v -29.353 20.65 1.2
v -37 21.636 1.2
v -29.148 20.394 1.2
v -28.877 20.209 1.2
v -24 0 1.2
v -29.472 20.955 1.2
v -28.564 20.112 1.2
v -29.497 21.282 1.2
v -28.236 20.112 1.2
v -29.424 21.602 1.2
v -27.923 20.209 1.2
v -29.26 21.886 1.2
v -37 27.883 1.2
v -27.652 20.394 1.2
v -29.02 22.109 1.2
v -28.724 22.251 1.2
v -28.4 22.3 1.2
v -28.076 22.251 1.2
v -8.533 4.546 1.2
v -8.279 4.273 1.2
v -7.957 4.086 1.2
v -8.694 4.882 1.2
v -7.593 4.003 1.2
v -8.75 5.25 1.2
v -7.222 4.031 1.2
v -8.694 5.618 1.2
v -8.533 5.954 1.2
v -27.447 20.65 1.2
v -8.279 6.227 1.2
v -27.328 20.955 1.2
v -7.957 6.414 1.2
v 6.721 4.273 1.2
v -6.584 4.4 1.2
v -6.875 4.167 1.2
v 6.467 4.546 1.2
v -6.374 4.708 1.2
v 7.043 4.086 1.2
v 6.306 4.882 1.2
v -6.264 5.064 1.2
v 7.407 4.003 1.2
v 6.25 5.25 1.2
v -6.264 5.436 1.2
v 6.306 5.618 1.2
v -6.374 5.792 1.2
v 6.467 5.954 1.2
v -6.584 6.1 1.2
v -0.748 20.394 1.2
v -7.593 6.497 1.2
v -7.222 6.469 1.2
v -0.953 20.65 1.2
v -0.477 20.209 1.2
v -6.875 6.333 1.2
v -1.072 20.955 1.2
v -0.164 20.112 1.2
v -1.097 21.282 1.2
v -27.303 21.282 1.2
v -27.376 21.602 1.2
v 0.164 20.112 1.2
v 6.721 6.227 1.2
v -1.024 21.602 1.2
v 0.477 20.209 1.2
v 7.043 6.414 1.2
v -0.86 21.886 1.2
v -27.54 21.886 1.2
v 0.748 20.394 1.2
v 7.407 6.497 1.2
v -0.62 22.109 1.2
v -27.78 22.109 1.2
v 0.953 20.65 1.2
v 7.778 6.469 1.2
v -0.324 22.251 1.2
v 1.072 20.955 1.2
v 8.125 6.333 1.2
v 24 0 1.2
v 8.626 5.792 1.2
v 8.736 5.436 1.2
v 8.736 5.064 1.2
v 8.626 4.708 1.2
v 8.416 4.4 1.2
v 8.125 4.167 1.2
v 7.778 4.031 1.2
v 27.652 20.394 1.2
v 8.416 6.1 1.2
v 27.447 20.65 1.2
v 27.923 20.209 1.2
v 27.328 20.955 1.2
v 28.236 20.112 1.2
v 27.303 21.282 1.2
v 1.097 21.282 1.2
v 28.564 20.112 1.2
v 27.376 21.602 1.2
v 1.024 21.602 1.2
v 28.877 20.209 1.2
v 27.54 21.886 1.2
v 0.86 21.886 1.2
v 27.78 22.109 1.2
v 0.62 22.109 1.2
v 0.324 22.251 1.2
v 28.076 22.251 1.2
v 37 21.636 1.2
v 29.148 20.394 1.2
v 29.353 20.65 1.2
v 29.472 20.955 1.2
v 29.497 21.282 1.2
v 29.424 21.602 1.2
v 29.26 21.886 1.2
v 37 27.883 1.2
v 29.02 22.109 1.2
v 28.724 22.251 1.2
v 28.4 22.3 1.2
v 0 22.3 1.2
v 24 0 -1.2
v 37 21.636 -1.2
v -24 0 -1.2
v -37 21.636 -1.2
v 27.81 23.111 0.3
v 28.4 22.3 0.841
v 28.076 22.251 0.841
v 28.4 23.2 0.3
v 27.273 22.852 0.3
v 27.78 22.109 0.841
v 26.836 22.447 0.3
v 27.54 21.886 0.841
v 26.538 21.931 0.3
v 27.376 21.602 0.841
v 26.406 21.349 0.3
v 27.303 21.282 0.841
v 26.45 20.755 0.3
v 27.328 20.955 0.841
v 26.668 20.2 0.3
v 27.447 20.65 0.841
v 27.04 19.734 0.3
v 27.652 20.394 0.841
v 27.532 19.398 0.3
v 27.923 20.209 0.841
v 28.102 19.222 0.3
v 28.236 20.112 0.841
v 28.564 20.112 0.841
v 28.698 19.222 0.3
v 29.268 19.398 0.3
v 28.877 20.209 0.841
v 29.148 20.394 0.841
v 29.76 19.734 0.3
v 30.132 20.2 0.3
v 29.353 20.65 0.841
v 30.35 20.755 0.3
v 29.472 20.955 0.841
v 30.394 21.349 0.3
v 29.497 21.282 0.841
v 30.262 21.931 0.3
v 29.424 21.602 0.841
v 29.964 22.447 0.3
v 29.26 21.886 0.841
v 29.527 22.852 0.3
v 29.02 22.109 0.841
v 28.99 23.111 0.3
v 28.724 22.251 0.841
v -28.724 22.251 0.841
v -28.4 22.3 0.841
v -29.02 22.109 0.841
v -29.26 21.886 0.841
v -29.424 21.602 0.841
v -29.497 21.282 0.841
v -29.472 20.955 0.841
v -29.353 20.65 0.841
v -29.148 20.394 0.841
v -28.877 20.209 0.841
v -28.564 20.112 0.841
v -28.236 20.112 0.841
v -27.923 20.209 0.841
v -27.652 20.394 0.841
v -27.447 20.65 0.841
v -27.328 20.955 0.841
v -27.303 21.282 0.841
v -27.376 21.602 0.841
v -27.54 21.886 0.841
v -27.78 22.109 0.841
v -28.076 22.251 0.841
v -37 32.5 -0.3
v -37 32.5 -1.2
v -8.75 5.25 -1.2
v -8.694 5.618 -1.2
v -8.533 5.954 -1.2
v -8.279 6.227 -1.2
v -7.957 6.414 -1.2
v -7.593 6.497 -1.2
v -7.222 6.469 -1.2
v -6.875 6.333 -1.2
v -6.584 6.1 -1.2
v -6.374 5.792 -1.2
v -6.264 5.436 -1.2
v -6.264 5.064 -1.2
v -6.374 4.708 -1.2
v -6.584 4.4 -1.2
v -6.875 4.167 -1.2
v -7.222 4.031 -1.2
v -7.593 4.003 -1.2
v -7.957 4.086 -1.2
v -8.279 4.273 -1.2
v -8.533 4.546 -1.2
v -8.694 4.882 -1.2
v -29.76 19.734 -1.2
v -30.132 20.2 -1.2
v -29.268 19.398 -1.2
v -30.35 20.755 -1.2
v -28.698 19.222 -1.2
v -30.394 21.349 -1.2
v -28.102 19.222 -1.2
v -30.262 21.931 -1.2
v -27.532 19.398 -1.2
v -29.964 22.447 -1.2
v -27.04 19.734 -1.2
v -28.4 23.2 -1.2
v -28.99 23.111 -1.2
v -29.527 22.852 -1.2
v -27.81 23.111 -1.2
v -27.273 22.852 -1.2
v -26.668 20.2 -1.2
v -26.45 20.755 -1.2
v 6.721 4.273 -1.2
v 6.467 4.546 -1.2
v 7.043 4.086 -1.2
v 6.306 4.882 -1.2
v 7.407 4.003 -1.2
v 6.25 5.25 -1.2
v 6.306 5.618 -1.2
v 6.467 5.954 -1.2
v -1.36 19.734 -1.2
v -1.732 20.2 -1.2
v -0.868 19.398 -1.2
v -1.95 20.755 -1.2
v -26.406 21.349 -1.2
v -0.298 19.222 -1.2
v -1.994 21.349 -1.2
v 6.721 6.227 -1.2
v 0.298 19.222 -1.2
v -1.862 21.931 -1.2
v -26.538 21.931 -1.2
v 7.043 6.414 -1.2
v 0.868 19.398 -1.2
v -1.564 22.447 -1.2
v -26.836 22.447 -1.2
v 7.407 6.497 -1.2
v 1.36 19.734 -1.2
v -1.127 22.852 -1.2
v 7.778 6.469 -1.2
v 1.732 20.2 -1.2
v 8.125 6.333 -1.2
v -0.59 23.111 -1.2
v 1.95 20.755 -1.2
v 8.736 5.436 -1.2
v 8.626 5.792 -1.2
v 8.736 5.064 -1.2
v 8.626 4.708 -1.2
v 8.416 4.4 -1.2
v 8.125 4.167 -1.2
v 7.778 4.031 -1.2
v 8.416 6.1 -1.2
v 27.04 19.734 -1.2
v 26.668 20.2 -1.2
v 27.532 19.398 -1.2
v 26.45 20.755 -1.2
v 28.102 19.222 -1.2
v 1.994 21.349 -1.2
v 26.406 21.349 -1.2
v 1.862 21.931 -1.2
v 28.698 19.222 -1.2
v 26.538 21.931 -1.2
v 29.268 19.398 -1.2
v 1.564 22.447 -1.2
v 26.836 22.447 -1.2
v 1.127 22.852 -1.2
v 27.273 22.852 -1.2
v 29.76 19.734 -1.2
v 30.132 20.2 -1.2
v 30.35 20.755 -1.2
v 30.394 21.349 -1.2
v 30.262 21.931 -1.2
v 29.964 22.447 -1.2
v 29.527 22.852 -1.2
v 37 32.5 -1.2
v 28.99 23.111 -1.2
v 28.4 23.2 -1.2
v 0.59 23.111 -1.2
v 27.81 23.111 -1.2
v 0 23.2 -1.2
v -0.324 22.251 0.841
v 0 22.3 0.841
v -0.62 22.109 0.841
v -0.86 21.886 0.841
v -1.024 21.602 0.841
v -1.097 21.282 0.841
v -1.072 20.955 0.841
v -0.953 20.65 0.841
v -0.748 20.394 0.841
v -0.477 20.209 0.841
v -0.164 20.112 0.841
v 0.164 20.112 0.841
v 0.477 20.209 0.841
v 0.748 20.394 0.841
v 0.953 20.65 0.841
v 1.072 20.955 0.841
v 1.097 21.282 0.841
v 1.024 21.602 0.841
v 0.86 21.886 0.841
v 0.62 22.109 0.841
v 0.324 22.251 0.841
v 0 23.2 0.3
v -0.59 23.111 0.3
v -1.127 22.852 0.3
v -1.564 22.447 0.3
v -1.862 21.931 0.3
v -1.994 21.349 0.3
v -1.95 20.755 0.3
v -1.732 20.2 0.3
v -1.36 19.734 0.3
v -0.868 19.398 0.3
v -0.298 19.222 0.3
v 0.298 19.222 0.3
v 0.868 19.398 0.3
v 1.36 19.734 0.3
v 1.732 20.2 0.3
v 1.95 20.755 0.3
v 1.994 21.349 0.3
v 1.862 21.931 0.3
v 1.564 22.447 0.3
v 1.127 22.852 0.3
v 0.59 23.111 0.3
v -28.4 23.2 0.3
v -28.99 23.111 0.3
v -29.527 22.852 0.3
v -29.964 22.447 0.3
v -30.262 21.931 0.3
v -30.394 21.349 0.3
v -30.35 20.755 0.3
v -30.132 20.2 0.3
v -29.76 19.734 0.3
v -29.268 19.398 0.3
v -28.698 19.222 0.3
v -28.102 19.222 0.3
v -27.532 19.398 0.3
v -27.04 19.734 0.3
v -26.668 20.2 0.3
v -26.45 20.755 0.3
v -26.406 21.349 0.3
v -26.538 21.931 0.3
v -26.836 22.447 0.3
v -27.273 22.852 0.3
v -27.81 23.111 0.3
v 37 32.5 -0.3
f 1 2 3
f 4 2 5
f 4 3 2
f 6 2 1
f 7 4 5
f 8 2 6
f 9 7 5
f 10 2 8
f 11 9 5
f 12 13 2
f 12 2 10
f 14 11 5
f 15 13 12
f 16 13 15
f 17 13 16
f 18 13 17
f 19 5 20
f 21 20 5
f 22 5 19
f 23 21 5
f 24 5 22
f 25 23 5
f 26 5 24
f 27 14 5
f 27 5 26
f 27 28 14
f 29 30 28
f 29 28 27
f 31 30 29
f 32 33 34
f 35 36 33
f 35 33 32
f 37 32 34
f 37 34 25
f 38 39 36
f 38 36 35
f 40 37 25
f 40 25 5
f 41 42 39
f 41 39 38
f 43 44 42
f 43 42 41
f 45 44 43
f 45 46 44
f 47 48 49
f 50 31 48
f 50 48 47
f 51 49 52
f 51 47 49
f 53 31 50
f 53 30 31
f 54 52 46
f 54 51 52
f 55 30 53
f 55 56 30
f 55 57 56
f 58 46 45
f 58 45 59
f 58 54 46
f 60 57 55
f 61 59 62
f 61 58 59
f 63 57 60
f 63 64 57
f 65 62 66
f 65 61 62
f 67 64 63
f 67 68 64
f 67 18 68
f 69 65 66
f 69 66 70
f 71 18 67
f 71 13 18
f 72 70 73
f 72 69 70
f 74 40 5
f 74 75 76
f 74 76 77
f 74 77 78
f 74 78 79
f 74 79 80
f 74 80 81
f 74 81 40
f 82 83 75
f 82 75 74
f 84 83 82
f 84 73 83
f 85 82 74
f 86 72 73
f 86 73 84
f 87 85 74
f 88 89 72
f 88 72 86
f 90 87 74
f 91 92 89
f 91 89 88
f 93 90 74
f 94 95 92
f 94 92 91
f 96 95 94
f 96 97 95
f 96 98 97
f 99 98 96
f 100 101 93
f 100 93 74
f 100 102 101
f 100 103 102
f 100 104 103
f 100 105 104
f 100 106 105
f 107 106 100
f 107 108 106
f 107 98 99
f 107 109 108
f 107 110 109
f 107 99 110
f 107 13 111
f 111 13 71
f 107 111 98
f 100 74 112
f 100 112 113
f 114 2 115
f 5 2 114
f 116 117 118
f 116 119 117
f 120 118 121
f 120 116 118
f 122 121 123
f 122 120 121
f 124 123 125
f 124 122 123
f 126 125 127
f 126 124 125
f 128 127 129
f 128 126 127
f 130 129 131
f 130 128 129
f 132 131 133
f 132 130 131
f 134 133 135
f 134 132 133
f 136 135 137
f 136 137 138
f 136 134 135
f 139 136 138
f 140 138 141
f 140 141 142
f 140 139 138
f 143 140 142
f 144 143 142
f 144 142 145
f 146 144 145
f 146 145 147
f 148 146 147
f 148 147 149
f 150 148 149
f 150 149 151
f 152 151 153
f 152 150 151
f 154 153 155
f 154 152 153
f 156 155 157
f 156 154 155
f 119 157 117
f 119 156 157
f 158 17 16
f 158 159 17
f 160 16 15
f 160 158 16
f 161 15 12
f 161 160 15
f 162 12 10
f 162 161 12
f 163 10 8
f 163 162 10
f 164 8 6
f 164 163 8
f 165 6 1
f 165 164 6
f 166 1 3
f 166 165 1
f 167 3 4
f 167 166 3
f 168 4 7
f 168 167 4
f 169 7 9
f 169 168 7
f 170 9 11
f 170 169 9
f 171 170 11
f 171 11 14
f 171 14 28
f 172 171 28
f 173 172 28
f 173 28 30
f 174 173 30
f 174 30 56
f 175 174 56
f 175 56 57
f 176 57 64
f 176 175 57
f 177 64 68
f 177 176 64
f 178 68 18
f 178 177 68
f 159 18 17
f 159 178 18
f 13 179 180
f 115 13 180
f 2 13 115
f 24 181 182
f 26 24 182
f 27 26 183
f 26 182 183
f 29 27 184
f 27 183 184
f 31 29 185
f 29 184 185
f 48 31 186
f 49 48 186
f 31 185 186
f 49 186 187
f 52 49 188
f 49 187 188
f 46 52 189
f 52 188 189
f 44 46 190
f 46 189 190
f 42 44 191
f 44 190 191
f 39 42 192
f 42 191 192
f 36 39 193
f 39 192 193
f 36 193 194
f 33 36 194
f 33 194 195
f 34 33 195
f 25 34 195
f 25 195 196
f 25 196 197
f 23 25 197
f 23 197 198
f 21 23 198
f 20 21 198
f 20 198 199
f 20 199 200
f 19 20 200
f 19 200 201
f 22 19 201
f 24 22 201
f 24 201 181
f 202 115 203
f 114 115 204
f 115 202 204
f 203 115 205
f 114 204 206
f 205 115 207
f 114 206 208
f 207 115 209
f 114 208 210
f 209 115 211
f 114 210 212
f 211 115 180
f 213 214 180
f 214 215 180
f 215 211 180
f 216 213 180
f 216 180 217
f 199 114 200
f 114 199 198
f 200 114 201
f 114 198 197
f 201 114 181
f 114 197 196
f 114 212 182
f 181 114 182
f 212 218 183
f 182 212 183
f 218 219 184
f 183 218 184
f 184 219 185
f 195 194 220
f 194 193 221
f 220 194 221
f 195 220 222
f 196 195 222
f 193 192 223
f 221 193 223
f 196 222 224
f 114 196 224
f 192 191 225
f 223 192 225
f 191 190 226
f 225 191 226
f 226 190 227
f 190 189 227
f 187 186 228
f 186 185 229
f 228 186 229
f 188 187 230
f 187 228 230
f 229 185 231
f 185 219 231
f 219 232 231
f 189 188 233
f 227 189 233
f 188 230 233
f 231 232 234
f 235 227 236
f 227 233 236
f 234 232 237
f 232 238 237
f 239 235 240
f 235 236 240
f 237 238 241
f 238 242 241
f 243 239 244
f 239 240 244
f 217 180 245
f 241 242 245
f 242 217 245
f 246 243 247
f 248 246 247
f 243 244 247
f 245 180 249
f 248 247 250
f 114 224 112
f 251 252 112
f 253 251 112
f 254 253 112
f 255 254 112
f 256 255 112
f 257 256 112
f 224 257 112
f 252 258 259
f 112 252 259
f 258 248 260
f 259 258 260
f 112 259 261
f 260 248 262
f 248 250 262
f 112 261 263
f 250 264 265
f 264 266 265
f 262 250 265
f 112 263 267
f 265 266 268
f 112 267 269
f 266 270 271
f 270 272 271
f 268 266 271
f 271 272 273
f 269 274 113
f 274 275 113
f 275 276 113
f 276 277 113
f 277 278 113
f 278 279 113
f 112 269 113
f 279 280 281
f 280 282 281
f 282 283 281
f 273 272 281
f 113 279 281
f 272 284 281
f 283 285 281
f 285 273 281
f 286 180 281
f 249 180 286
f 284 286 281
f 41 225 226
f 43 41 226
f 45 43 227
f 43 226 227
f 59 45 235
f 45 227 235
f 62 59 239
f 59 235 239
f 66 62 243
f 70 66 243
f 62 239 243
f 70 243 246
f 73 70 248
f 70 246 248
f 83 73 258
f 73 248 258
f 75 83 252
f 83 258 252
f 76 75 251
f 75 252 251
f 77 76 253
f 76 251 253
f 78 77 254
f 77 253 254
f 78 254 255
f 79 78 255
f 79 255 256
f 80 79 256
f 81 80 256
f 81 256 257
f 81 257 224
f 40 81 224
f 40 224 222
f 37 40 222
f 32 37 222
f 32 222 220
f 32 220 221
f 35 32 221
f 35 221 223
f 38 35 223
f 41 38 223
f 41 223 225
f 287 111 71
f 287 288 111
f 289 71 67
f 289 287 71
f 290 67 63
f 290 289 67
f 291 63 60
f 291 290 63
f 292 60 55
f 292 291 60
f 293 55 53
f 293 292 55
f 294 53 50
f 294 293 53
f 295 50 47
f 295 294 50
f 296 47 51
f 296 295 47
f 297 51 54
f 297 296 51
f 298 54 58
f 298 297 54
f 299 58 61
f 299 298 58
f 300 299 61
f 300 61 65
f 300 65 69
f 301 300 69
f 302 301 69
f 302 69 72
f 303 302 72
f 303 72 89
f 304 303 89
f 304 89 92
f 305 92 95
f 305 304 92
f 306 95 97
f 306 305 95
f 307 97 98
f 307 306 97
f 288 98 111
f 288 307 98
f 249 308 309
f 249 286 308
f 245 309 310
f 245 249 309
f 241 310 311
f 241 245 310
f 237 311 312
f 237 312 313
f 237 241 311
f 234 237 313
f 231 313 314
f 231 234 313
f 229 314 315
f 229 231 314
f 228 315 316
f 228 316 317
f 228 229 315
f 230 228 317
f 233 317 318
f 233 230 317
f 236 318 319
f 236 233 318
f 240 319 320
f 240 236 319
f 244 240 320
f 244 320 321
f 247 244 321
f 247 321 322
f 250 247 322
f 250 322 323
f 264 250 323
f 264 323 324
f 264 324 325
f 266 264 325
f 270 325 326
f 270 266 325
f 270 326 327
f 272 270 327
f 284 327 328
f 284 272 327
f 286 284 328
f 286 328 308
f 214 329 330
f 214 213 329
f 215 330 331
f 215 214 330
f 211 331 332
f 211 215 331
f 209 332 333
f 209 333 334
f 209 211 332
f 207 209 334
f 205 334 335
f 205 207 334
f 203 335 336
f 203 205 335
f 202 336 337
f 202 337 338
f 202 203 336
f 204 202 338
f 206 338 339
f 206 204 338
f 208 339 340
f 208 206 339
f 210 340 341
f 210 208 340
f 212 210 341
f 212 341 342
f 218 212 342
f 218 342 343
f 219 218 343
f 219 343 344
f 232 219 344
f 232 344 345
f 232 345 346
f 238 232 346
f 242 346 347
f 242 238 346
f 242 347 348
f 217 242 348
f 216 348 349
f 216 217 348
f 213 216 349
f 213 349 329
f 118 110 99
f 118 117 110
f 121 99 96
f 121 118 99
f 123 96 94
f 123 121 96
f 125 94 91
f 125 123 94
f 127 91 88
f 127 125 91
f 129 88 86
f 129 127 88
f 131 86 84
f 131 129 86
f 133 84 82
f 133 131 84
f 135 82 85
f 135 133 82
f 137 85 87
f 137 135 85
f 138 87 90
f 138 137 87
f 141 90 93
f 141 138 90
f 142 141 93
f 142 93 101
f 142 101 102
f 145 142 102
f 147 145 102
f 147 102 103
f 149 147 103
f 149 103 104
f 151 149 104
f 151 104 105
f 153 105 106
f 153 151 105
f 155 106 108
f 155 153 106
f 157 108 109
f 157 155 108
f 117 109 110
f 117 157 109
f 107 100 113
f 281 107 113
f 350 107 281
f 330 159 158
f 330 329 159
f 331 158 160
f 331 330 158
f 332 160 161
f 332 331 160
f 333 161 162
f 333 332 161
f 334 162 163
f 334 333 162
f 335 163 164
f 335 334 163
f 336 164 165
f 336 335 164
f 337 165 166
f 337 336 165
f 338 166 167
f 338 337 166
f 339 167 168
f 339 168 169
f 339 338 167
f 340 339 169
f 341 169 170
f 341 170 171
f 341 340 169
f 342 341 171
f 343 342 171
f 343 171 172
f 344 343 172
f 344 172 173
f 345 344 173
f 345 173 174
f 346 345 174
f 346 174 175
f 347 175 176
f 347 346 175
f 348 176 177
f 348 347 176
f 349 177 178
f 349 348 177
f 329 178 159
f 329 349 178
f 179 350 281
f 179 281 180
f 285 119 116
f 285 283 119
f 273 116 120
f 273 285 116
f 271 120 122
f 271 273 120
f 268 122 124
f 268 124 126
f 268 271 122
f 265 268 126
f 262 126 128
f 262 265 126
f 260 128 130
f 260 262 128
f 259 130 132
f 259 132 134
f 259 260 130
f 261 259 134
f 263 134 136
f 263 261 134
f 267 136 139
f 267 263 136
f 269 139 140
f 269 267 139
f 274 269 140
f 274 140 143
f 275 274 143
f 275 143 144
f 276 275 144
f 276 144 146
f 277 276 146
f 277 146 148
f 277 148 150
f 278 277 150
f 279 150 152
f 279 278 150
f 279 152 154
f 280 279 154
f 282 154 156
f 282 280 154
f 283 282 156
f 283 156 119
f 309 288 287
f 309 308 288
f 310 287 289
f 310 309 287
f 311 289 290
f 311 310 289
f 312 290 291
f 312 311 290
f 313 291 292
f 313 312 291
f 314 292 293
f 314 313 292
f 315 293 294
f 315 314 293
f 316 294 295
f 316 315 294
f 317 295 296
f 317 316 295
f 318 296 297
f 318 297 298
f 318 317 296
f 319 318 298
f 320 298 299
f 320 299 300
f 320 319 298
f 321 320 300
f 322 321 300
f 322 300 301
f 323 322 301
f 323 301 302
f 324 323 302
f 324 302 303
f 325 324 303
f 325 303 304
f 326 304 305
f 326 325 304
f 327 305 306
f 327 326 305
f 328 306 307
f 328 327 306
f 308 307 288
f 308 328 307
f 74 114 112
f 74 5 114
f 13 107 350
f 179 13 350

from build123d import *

# Parameters (mm, degrees)
BOSS_EXTRUDE1_DEPTH            = 1.2
CUT_EXTRUDE1_DEPTH             = 81.831243959
F_2_5_2_5_DIAMETER_HOLE1_D     = 2.5
F_2_5_2_5_DIAMETER_HOLE1_DEPTH = 10
F_2_5_2_5_DIAMETER_HOLE1_TIP   = 0.751075774
HOLEWZD1_AT_2_COUNT            = 2
HOLEWZD1_AT_2_PITCH            = 28.4
HOLEWZD1_AT_3_COUNT            = 2
HOLEWZD1_AT_3_PITCH            = 56.8


with BuildPart() as part:
    # Sketch1 → Boss-Extrude1 (new, symmetric)
    with BuildSketch(Plane.XY):
        Polygon((-24, 0), (24, 0), (37, 21.635633271), (37, 32.5), (-37, 32.5), (-37, 21.635633271), align=None)
    extrude(amount=BOSS_EXTRUDE1_DEPTH, both=True)

    # Sketch2 → Cut-Extrude1 (cut, through all)
    with BuildSketch(Plane(origin=(37, 0, 0), x_dir=(0, 0, -1), z_dir=(1, 0, 0))):
        Polygon((-1.2, 27.883474694), (0.3, 32.5), (-1.2, 32.5), align=None)
    extrude(amount=-CUT_EXTRUDE1_DEPTH, mode=Mode.SUBTRACT)

    # Ø2.5 (2.5) Diameter Hole1
    with Locations(Plane.XY.offset(1.2)):
        with Locations((-7.5, 5.25), (7.5, 5.25)):
            Hole(F_2_5_2_5_DIAMETER_HOLE1_D / 2, depth=F_2_5_2_5_DIAMETER_HOLE1_DEPTH)
            with Locations((0, 0, -(F_2_5_2_5_DIAMETER_HOLE1_DEPTH + F_2_5_2_5_DIAMETER_HOLE1_TIP / 2))):  # 118° drill point
                Cone(0, F_2_5_2_5_DIAMETER_HOLE1_D / 2, F_2_5_2_5_DIAMETER_HOLE1_TIP, mode=Mode.SUBTRACT)

    # Sketch10 → HoleWzd1 (revolve, cut)
    with BuildSketch(Plane(origin=(28.4, 21.2, -1.2), x_dir=(0, 1, 0), z_dir=(1, 0, 0))):
        Polygon((0, 0), (0, 2.4), (1.1, 2.4), (1.1, 2.040774557), (2, 1.5), (2, 0), align=None)
    holewzd1 = revolve(axis=Axis((28.4, 21.2, -7.330023899), (0, 0, 1)), mode=Mode.SUBTRACT)

    # HoleWzd1 at 2: HoleWzd1 ×2
    with Locations(*[(-i * HOLEWZD1_AT_2_PITCH, 0, 0) for i in range(1, HOLEWZD1_AT_2_COUNT)]):
        add(holewzd1, mode=Mode.SUBTRACT)

    # HoleWzd1 at 3: HoleWzd1 ×2
    with Locations(*[(-i * HOLEWZD1_AT_3_PITCH, 0, 0) for i in range(1, HOLEWZD1_AT_3_COUNT)]):
        add(holewzd1, mode=Mode.SUBTRACT)


solid = part.part
